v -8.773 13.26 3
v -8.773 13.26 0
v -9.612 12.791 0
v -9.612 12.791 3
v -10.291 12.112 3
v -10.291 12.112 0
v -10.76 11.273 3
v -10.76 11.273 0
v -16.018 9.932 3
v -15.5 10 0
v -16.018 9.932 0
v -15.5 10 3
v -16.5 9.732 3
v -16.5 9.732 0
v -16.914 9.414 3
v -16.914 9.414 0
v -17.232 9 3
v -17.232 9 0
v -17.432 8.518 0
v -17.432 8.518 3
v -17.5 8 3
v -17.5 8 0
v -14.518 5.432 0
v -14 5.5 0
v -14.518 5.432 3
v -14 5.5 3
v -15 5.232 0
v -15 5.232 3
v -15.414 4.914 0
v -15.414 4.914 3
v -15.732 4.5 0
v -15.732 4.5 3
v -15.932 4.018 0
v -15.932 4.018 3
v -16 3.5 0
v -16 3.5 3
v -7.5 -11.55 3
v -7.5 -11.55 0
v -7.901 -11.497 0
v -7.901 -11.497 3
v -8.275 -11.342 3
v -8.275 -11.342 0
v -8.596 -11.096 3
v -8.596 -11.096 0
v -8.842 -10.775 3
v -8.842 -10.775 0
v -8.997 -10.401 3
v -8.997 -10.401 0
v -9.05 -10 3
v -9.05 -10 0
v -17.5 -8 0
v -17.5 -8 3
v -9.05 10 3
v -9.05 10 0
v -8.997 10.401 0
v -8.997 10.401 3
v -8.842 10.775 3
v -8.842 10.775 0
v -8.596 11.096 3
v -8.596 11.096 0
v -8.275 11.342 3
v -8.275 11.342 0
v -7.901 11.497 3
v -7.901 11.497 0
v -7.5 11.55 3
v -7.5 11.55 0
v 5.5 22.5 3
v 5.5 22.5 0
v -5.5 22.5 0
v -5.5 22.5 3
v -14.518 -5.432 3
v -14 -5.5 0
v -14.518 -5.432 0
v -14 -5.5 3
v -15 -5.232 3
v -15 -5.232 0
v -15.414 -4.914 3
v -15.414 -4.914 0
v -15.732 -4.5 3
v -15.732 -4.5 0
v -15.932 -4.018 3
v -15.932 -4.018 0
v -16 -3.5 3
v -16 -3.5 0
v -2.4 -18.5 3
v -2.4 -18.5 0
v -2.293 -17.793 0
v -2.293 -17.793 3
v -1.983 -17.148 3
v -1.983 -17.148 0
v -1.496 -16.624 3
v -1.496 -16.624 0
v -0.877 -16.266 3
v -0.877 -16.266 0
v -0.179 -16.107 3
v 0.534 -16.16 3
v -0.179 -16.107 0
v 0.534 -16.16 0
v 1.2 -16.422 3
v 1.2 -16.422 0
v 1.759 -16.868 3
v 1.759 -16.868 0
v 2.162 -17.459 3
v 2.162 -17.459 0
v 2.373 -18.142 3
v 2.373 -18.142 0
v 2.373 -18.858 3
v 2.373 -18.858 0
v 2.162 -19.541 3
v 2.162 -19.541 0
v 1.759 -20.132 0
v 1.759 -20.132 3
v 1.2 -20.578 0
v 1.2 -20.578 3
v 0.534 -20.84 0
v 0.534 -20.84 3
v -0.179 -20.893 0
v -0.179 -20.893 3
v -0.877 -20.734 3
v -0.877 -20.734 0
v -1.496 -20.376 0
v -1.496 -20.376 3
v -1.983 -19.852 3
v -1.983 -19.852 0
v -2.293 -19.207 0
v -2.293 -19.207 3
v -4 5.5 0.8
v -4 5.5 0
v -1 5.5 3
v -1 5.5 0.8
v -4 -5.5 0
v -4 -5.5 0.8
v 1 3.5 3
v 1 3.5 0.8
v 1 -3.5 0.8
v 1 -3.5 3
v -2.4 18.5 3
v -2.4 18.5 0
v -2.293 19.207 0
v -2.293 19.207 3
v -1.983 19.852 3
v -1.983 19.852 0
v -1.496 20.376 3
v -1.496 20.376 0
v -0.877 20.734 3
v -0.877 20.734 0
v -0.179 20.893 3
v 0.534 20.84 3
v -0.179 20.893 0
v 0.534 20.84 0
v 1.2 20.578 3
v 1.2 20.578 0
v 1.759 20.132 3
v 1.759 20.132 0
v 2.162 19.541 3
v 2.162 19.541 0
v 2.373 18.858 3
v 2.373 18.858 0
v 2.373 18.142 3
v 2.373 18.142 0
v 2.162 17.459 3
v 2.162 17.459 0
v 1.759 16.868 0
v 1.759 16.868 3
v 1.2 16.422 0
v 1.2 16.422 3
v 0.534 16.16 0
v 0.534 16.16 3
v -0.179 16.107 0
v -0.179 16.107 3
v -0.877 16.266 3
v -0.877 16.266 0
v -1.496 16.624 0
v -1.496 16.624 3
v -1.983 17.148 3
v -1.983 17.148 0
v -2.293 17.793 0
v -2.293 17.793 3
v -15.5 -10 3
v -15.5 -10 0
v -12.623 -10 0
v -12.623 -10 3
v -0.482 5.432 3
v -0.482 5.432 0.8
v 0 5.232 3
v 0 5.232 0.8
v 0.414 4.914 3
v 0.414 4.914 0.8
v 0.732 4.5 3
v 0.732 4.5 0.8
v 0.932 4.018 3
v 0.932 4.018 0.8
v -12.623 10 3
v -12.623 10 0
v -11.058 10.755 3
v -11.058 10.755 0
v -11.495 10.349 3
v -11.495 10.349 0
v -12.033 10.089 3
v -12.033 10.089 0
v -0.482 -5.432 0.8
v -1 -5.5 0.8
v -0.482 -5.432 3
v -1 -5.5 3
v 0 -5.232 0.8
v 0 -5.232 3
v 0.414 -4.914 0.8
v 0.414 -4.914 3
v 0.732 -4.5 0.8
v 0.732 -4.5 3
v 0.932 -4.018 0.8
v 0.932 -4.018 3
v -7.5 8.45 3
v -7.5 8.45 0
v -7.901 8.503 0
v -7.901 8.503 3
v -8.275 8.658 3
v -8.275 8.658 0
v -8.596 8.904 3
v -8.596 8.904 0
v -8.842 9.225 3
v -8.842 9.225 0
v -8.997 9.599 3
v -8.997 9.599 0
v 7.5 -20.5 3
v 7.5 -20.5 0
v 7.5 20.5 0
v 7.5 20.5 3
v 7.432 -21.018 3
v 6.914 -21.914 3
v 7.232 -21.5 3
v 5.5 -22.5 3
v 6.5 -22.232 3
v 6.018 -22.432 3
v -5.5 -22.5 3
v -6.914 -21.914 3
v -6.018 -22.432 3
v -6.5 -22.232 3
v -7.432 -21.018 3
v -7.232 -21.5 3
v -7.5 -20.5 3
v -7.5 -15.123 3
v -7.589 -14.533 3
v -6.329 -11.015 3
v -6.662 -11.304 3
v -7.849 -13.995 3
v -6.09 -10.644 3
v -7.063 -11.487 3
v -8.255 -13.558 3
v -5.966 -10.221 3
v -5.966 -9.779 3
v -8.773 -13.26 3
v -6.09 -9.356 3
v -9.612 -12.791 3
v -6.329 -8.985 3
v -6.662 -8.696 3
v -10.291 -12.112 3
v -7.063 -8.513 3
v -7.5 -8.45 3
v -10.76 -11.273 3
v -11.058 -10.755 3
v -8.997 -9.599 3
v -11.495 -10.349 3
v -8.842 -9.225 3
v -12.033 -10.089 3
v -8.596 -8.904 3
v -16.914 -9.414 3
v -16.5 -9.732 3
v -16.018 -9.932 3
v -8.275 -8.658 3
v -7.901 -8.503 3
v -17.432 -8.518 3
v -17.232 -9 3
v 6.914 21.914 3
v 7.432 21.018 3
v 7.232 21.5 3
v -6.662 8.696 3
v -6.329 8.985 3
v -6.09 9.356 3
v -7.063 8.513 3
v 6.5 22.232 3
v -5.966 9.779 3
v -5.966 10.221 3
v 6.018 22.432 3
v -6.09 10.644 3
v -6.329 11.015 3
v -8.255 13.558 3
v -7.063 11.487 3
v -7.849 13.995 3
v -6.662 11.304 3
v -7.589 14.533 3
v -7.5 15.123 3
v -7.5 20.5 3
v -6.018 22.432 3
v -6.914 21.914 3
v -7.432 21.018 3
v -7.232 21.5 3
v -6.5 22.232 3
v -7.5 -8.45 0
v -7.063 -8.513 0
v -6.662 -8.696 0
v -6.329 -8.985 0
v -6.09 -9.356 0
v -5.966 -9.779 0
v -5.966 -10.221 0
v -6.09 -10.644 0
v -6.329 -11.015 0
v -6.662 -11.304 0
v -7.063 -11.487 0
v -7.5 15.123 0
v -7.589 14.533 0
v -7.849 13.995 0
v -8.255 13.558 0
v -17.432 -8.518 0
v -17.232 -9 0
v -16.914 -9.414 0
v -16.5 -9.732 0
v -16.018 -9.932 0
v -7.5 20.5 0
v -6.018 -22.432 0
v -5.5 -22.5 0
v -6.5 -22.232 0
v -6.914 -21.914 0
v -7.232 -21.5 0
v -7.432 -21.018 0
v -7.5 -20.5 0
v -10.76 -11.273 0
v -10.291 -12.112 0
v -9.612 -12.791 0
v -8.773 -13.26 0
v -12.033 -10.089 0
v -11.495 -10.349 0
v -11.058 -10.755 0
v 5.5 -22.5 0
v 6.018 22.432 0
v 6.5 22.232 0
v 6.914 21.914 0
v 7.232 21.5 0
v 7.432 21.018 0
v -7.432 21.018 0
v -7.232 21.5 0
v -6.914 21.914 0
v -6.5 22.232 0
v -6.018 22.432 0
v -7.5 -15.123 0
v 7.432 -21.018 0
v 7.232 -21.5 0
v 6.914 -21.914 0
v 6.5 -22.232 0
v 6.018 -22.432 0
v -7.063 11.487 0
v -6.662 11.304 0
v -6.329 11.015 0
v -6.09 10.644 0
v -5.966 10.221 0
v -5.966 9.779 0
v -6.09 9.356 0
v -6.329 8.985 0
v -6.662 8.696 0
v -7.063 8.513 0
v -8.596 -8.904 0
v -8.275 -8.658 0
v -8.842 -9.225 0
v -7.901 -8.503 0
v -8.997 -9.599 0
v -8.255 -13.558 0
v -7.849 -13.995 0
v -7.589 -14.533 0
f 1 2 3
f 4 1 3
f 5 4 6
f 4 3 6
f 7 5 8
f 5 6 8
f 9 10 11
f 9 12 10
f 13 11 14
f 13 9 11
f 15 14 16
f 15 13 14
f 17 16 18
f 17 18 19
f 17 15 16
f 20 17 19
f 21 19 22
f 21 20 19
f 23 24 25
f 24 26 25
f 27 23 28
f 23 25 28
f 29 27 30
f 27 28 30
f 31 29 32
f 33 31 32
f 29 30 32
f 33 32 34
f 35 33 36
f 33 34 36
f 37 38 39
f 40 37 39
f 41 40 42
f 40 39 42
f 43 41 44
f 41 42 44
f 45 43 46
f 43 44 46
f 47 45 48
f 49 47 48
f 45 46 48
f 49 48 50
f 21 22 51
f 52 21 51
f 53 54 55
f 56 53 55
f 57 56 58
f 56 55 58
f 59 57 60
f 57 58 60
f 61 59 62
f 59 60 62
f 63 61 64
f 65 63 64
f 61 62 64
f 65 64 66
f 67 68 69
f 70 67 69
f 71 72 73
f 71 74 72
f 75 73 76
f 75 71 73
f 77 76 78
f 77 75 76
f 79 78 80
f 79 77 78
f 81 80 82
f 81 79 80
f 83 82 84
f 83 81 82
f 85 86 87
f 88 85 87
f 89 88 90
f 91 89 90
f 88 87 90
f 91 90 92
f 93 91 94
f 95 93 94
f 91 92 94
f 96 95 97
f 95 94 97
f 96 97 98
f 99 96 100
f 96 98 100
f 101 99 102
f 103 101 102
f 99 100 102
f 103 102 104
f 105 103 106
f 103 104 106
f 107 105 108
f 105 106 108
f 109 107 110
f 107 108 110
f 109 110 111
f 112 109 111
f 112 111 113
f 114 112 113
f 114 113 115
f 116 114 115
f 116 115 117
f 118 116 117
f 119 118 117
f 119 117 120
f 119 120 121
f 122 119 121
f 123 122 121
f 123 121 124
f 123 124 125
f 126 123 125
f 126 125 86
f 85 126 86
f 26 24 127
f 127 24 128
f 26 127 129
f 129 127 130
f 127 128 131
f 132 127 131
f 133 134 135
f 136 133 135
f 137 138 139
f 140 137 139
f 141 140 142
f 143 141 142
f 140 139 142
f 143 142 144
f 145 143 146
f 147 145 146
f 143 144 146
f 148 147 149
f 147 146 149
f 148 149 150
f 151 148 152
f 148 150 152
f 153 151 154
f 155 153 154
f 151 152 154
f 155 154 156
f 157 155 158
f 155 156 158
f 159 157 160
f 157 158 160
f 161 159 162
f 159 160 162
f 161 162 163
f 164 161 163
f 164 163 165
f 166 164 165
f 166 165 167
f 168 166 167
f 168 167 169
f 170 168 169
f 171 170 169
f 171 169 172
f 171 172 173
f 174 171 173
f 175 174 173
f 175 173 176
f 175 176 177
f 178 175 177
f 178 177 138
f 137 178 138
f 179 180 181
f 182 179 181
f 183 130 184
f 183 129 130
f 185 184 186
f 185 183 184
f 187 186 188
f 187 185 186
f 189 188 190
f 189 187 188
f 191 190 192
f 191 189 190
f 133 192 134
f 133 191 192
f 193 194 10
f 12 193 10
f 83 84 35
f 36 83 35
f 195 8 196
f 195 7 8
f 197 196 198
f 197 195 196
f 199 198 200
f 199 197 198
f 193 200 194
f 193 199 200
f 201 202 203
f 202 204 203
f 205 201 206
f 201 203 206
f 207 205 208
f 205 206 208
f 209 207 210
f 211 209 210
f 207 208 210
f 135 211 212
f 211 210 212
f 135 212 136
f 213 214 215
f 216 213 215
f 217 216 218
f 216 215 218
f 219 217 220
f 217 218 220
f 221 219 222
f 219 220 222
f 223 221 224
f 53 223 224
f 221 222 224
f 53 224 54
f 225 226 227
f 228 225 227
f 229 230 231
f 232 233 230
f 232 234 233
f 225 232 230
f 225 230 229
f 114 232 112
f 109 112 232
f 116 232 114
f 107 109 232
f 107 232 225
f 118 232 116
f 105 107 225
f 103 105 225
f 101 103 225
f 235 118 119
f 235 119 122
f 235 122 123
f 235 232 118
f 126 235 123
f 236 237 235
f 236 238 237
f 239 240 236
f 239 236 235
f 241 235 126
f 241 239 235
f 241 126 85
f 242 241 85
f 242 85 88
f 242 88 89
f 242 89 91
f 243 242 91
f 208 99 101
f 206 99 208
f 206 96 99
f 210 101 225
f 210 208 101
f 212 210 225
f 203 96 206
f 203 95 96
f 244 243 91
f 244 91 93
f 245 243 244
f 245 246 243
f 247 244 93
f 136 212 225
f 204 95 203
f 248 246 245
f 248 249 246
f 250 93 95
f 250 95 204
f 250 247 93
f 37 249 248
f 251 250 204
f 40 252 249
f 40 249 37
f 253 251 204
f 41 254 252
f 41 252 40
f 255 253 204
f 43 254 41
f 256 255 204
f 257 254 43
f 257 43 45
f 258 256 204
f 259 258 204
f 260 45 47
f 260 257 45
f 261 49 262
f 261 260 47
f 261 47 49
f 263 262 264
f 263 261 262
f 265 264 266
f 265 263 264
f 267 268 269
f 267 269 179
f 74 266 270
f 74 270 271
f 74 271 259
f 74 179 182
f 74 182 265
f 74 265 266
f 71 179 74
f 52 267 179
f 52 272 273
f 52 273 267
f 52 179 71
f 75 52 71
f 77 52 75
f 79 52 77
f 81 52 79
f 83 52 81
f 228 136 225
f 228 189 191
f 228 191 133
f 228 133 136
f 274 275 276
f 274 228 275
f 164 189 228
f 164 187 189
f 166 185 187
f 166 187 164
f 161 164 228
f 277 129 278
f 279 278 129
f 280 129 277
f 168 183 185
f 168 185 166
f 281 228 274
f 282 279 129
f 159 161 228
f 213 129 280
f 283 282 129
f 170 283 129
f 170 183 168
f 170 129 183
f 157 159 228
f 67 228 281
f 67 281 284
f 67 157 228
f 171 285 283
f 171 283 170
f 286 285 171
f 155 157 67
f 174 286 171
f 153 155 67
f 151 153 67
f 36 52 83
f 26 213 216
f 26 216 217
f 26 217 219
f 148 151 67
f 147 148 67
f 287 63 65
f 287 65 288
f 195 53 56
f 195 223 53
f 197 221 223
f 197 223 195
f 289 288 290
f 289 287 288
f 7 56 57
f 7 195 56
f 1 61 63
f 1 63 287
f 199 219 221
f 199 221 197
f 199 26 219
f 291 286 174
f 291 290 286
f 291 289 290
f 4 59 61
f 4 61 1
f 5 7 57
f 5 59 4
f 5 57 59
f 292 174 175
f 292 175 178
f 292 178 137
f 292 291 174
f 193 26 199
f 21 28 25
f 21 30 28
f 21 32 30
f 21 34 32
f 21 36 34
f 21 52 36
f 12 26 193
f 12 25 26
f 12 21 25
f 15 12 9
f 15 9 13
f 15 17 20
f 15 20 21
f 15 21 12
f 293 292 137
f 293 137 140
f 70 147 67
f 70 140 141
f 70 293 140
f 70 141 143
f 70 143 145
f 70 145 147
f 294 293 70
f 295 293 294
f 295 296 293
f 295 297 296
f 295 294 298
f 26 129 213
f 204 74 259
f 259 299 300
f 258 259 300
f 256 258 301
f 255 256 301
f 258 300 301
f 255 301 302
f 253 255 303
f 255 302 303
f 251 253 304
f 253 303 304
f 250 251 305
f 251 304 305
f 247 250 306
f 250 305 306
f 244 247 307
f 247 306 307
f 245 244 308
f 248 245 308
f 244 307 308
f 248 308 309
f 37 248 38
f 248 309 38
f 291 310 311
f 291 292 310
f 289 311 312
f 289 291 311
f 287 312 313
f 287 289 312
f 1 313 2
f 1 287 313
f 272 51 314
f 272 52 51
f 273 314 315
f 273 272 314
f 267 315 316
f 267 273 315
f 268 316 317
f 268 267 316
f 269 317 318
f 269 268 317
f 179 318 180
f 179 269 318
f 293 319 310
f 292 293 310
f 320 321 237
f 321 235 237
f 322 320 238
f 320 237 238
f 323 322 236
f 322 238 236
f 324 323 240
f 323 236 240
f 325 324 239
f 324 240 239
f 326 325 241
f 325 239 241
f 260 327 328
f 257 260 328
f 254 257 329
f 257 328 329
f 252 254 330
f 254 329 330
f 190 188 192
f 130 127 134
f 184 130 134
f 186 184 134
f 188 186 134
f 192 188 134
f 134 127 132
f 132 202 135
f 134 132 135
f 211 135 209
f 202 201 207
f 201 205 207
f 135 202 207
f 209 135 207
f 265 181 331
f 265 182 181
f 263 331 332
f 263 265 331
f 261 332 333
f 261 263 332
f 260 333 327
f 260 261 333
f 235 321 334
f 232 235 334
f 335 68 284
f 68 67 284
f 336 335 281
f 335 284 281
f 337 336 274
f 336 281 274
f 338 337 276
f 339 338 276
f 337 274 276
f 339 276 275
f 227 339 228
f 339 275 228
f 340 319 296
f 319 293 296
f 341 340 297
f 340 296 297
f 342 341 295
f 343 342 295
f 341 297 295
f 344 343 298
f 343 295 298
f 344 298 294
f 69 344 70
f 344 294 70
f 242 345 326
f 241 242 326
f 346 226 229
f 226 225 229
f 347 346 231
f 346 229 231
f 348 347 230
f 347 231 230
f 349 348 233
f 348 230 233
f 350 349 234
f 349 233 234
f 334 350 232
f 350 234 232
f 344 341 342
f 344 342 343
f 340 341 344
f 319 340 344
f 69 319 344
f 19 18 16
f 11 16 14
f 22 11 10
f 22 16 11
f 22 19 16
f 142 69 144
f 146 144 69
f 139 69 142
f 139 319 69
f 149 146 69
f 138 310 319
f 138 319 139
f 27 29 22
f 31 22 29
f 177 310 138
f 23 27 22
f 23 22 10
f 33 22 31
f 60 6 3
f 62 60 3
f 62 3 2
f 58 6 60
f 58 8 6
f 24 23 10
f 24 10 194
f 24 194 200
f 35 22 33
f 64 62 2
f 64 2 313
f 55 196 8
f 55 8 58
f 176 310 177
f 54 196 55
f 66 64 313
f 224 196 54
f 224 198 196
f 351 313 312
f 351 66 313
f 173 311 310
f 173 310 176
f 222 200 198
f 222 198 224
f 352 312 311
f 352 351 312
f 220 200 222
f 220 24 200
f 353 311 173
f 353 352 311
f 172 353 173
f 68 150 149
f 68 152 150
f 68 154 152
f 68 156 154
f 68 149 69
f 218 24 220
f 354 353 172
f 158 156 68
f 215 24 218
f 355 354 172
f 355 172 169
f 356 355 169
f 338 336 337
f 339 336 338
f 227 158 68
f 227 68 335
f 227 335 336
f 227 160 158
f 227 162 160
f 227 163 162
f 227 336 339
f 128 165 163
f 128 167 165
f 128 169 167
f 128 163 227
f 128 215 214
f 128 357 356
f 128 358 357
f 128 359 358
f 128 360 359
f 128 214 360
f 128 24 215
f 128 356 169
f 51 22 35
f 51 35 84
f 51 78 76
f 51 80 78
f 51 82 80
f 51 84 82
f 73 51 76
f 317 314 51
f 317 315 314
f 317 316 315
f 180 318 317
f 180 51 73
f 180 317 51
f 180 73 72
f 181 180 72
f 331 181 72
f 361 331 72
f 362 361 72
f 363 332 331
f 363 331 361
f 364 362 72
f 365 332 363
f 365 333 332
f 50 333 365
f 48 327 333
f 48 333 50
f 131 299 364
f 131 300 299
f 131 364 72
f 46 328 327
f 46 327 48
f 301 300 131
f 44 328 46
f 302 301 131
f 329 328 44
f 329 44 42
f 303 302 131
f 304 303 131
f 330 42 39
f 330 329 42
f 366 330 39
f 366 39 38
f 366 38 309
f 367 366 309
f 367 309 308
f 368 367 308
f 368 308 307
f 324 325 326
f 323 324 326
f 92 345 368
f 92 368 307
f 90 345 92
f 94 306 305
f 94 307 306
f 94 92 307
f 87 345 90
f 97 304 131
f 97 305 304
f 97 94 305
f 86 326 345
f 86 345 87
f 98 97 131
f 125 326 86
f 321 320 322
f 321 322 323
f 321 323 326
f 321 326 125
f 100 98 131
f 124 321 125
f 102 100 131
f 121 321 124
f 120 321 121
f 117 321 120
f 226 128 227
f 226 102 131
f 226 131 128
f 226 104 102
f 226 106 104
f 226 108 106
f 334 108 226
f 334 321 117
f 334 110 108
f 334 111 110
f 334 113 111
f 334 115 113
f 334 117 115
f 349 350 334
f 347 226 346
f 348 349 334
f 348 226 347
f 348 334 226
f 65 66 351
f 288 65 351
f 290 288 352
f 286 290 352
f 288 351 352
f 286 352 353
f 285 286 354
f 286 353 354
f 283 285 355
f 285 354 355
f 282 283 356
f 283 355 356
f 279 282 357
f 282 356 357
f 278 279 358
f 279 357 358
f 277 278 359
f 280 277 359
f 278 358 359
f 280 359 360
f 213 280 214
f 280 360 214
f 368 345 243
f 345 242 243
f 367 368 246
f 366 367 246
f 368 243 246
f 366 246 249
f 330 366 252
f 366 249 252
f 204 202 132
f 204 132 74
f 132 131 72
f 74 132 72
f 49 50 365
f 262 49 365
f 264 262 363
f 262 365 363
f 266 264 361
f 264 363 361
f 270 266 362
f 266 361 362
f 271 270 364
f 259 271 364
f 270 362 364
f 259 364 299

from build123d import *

# Parameters (mm, degrees)
EXTRUDE_1_DEPTH    = 3
HOLE_WIZARD_M4_1_D = 4.8
SKETCH_5_W         = 5
SKETCH_5_H         = 11
EXTRUDE_2_DEPTH    = 0.8
FILLET_6_R         = 2


with BuildPart() as part:
    # ｽｹｯﾁ1 → ﾎﾞｽ - 押し出し1 (new body)
    with BuildSketch(Plane(origin=(0, 0, 0), x_dir=(0, 1, 0), z_dir=(0, 0, 1))):
        with BuildLine():
            Line((-22.5, 7.5), (-22.5, -7.5))
            Line((-22.5, -7.5), (22.5, -7.5))
            Line((22.5, -7.5), (22.5, 7.5))
            Line((22.5, 7.5), (13.5, 7.5))
            ThreePointArc((13.5, 7.5), (10, 4), (6.5, 7.5))
            Line((6.5, 7.5), (5.5, 7.5))
            Line((5.5, 7.5), (5.5, -1))
            Line((5.5, -1), (-5.5, -1))
            Line((-5.5, -1), (-5.5, 7.5))
            Line((-5.5, 7.5), (-6.5, 7.5))
            ThreePointArc((-6.5, 7.5), (-10, 4), (-13.5, 7.5))
            Line((-13.5, 7.5), (-22.5, 7.5))
        make_face()
        with BuildLine():
            Line((-10, 17.5), (-10, 11))
            ThreePointArc((-10, 11), (-7.525126266, 9.974873734), (-6.5, 7.5))
            Line((-6.5, 7.5), (-5.5, 7.5))
            Line((-5.5, 7.5), (-5.5, 16))
            Line((-5.5, 16), (5.5, 16))
            Line((5.5, 16), (5.5, 7.5))
            Line((5.5, 7.5), (6.5, 7.5))
            ThreePointArc((6.5, 7.5), (7.525126266, 9.974873734), (10, 11))
            Line((10, 11), (10, 17.5))
            Line((10, 17.5), (-10, 17.5))
        make_face()
        with BuildLine():
            ThreePointArc((-6.5, 7.5), (-7.525126266, 9.974873734), (-10, 11))
            Line((-10, 11), (-10, 9.05))
            ThreePointArc((-10, 9.05), (-8.903984489, 8.596015511), (-8.45, 7.5))
            Line((-8.45, 7.5), (-6.5, 7.5))
        make_face()
        with BuildLine():
            ThreePointArc((-10, 11), (-12.474873734, 9.974873734), (-13.5, 7.5))
            Line((-13.5, 7.5), (-11.55, 7.5))
            ThreePointArc((-11.55, 7.5), (-11.096015511, 8.596015511), (-10, 9.05))
            Line((-10, 9.05), (-10, 11))
        make_face()
        with BuildLine():
            Line((-11.55, 7.5), (-13.5, 7.5))
            ThreePointArc((-13.5, 7.5), (-10, 4), (-6.5, 7.5))
            Line((-6.5, 7.5), (-8.45, 7.5))
            ThreePointArc((-8.45, 7.5), (-10, 5.95), (-11.55, 7.5))
        make_face()
        with BuildLine():
            Line((10, 9.05), (10, 11))
            ThreePointArc((10, 11), (7.525126266, 9.974873734), (6.5, 7.5))
            Line((6.5, 7.5), (8.45, 7.5))
            ThreePointArc((8.45, 7.5), (8.903984489, 8.596015511), (10, 9.05))
        make_face()
        with BuildLine():
            Line((11.55, 7.5), (13.5, 7.5))
            ThreePointArc((13.5, 7.5), (12.474873734, 9.974873734), (10, 11))
            Line((10, 11), (10, 9.05))
            ThreePointArc((10, 9.05), (11.096015511, 8.596015511), (11.55, 7.5))
        make_face()
        with BuildLine():
            ThreePointArc((6.5, 7.5), (10, 4), (13.5, 7.5))
            Line((13.5, 7.5), (11.55, 7.5))
            ThreePointArc((11.55, 7.5), (10, 5.95), (8.45, 7.5))
            Line((8.45, 7.5), (6.5, 7.5))
        make_face()
    extrude(amount=EXTRUDE_1_DEPTH)

    # M4 すきま穴1 (through all)
    with Locations(Plane.XY.offset(3)):
        with Locations((0, -18.5), (0, 18.5)):
            Hole(HOLE_WIZARD_M4_1_D / 2)

    # ｽｹｯﾁ5 → ﾎﾞｽ - 押し出し2 (add)
    with BuildSketch(Plane(origin=(0, 0, 0), x_dir=(1, 0, 0), z_dir=(0, 0, -1))):
        with Locations((-1.5, 0)):
            Rectangle(SKETCH_5_W, SKETCH_5_H)
    extrude(amount=-EXTRUDE_2_DEPTH)

    # ﾌｨﾚｯﾄ6
    fillet_6_edges = [part.edges().sort_by_distance(p)[0] for p in [
        (-16, -5.5, 1.5),
        (1, -5.5, 1.9),
        (1, 5.5, 1.9),
        (-16, 5.5, 1.5),
        (-7.5, 13.5, 1.5),
        (-7.5, 22.5, 1.5),
        (7.5, 22.5, 1.5),
        (7.5, -22.5, 1.5),
        (-7.5, -22.5, 1.5),
        (-7.5, -13.5, 1.5),
        (-11, -10, 1.5),
        (-17.5, -10, 1.5),
        (-17.5, 10, 1.5),
        (-11, 10, 1.5),
    ]]
    fillet(fillet_6_edges, radius=FILLET_6_R)


solid = part.part
